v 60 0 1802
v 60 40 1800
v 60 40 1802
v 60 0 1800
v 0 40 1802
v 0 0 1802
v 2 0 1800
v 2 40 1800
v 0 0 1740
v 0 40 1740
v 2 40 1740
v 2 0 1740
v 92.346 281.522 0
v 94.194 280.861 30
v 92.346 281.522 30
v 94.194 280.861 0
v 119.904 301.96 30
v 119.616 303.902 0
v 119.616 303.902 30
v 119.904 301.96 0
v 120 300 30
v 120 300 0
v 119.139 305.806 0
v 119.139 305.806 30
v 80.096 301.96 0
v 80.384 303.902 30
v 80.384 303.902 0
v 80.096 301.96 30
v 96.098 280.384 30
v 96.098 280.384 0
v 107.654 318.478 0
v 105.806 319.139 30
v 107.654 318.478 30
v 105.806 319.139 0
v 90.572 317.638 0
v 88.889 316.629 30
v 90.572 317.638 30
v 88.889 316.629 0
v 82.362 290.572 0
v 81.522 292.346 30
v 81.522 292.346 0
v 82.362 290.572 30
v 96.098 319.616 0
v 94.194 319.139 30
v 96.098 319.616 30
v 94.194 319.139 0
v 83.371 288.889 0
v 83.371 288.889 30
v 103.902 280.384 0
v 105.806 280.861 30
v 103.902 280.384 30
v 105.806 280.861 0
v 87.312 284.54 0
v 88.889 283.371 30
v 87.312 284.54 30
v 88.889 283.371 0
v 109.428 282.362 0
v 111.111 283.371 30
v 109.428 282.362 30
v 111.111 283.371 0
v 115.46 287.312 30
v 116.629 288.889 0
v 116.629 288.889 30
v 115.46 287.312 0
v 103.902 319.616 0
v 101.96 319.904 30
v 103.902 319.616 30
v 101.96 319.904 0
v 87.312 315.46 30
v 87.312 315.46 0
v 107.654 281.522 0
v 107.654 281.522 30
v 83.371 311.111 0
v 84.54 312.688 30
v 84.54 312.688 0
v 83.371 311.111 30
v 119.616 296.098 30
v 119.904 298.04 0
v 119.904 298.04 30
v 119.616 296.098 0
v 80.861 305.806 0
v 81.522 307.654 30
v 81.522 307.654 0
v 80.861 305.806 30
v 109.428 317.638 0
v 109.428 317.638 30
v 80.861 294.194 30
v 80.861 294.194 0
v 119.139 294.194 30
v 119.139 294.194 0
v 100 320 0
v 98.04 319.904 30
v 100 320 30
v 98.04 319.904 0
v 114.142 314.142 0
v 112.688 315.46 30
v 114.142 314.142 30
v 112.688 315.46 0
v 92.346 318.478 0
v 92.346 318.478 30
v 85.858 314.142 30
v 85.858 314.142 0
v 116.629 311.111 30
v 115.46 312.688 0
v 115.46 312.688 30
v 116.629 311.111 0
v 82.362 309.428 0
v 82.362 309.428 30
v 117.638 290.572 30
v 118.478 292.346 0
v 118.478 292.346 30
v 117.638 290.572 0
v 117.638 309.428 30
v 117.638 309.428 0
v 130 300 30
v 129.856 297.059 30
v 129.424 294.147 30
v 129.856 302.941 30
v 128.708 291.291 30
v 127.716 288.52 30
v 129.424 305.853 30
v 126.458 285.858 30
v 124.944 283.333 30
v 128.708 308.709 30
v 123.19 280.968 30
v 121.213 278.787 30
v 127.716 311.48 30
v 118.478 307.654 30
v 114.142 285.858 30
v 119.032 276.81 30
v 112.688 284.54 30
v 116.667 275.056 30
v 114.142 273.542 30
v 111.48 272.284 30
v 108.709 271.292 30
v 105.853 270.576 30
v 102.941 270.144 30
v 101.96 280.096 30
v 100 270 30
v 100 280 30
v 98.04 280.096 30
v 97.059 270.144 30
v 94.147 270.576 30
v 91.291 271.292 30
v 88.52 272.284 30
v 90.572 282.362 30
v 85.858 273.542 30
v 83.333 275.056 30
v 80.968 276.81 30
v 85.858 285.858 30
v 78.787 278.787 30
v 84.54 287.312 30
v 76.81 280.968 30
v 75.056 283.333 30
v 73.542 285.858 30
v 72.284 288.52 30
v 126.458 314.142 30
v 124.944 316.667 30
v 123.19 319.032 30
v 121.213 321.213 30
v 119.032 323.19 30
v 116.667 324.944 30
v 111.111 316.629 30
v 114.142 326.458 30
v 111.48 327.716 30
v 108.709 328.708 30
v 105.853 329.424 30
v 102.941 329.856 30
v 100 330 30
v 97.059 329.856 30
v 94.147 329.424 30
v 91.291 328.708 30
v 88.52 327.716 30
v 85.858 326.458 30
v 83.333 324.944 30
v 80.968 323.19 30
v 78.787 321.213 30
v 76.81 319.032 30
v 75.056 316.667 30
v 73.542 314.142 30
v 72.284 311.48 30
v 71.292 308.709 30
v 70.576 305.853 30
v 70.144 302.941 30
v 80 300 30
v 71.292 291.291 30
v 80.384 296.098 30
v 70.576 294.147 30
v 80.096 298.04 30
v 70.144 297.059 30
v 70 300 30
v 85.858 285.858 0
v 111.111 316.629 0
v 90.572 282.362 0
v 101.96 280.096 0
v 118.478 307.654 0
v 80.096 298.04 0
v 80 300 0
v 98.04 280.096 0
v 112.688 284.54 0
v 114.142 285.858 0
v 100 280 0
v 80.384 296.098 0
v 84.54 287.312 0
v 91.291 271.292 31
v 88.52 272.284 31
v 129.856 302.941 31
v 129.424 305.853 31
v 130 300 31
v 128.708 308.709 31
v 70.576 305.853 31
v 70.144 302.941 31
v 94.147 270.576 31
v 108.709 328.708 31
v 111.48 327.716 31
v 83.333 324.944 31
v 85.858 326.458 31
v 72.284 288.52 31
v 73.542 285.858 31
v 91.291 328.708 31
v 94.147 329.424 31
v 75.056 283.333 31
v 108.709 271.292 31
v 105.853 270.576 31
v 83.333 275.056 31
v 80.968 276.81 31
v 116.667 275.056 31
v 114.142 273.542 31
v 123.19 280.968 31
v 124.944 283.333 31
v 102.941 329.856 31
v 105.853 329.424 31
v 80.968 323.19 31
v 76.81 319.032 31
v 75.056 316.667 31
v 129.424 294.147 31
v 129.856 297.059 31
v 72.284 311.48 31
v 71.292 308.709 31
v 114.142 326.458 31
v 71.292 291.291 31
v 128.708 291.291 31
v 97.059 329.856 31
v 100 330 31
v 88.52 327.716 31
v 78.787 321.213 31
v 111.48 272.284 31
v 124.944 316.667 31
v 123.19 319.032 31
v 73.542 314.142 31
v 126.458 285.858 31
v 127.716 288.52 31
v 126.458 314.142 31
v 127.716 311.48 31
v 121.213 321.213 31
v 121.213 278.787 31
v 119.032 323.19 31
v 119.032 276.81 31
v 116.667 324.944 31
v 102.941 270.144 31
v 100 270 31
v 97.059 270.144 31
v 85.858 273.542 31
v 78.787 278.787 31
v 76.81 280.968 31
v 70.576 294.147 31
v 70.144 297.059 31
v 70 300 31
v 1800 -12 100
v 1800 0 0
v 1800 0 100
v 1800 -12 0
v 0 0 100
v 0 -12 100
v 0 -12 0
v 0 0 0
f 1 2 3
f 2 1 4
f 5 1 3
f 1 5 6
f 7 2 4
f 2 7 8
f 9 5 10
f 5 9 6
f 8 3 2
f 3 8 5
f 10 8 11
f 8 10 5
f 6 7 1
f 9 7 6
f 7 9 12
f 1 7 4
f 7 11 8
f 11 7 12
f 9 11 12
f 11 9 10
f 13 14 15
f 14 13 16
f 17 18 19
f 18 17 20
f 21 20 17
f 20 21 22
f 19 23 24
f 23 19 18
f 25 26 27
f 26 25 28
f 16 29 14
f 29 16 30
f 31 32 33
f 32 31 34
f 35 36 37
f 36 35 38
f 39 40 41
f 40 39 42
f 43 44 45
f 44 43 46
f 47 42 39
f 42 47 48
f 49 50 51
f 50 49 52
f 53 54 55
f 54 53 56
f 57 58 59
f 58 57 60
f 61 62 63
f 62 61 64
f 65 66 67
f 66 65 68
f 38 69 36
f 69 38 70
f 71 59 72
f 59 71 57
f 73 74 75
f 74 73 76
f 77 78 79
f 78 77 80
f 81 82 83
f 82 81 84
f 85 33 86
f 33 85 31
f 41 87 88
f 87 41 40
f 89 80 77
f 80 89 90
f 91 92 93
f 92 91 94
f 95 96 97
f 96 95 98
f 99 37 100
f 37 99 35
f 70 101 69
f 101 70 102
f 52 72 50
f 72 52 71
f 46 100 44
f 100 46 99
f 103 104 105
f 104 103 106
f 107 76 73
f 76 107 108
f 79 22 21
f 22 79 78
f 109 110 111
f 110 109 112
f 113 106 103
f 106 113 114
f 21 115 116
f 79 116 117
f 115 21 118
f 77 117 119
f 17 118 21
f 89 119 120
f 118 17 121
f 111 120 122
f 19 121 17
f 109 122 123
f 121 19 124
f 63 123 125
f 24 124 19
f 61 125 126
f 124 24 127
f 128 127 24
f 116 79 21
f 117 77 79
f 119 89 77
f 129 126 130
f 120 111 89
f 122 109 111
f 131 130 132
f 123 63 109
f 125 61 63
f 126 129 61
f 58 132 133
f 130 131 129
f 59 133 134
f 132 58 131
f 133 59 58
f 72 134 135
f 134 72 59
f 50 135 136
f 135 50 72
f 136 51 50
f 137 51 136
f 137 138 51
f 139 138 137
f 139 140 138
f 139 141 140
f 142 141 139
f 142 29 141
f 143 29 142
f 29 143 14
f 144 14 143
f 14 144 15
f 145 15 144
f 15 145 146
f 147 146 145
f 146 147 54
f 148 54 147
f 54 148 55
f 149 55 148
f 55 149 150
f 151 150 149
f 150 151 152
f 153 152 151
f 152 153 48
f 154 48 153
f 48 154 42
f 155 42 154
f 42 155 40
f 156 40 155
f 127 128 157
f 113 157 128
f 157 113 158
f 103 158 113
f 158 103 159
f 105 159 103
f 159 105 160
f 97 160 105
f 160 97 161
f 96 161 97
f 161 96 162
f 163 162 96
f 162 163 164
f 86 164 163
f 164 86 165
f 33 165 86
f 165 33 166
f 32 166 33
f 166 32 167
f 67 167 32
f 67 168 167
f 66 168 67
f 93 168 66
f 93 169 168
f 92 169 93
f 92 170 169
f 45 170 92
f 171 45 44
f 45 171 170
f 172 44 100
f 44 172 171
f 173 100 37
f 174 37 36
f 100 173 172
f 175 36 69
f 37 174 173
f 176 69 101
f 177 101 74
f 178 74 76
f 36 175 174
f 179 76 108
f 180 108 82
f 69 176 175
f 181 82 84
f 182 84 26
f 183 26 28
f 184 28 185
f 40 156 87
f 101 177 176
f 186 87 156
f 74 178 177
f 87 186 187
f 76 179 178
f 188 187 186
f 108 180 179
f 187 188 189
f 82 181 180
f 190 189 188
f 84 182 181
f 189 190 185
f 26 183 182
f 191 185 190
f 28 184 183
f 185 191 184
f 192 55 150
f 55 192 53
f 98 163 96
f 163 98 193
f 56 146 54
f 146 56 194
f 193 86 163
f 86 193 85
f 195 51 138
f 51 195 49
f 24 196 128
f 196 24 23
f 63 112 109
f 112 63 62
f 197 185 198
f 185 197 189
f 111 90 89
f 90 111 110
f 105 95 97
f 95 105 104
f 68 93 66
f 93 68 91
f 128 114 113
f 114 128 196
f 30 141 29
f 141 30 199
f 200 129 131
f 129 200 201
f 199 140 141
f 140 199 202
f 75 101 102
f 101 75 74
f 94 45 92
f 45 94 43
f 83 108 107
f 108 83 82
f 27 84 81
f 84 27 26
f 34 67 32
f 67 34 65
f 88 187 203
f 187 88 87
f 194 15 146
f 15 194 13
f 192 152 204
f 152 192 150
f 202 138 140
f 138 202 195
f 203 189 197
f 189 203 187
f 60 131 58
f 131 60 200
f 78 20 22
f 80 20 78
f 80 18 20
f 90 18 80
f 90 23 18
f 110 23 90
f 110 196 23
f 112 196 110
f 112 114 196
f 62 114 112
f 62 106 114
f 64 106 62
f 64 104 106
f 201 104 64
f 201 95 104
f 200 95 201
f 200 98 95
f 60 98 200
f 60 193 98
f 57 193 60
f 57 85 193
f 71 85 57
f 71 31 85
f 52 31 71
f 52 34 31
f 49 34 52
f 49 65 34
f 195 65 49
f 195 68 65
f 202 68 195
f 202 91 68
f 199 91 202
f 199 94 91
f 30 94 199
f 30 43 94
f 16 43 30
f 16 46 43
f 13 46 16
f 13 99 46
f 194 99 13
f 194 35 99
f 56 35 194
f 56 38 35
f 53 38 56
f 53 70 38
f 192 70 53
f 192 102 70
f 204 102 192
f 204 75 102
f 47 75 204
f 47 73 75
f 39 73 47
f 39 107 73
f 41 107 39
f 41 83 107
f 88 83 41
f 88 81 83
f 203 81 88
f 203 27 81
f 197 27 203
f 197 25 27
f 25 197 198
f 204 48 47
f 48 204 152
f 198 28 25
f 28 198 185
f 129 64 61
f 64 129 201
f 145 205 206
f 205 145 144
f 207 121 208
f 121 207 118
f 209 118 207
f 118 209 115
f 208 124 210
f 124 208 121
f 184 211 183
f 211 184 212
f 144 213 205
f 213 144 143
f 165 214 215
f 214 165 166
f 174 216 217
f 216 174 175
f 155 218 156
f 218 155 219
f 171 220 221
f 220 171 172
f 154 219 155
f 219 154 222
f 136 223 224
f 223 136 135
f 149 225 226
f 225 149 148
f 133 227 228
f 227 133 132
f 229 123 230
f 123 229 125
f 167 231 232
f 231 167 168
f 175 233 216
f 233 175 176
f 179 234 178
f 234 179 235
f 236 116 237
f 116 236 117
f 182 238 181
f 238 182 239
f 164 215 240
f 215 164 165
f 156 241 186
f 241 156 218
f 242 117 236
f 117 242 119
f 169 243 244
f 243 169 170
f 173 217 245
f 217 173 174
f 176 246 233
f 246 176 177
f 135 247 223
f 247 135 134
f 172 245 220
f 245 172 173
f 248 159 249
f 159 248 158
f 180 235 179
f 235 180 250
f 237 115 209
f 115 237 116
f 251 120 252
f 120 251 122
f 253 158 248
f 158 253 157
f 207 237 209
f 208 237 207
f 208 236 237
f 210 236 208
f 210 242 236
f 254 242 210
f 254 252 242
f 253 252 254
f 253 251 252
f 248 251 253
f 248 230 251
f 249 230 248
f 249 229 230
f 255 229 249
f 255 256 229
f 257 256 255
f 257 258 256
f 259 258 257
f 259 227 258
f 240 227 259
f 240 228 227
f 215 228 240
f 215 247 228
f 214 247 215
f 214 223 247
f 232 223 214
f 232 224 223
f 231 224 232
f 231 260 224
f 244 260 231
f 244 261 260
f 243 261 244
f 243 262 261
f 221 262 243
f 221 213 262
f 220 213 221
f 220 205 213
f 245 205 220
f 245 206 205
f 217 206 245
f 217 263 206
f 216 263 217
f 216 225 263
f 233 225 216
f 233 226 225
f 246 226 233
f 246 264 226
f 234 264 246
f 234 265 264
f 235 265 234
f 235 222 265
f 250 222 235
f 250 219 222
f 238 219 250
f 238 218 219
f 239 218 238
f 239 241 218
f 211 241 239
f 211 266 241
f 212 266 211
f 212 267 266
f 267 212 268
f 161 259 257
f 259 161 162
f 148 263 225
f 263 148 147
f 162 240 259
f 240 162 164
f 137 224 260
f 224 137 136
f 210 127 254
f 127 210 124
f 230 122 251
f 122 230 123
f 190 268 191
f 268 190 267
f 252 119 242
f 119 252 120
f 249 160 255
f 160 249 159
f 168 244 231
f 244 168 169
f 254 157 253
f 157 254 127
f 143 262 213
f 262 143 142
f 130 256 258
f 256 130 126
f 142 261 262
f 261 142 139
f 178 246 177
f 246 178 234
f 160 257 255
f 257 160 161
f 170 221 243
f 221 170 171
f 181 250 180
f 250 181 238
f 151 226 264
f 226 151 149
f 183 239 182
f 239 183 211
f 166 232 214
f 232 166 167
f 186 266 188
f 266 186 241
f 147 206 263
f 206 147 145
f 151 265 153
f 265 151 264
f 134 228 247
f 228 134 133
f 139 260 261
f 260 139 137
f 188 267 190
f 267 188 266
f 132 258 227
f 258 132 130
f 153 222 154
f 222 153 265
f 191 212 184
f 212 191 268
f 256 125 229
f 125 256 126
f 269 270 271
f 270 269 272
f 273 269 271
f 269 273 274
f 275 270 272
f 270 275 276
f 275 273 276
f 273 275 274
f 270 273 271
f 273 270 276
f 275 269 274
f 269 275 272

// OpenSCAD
// Termite-break standoff mounting for built-in furniture
// CONCEPT GEOMETRY ONLY. Not a validated engineering drawing. Dimensions in mm.
// Generated by the Independent Intelligence Engine from the technical plan's parts list.
$fn = 64;

// wall_bracket (galvanised steel)
module wall_bracket() { cube([60, 40, 2]); }
translate([0, 0, 1800]) rotate([0, 0, 0]) wall_bracket();

// wall_bracket_leg (galvanised steel)
module wall_bracket_leg() { cube([2, 40, 60]); }
translate([0, 0, 1740]) rotate([0, 0, 0]) wall_bracket_leg();

// floor_foot (steel leveller)
module floor_foot() { cylinder(h = 30, d = 40); }
translate([100, 300, 0]) rotate([0, 0, 0]) floor_foot();

// shield_lip (galvanised steel)
module shield_lip() { cylinder(h = 1, d = 60); }
translate([100, 300, 30]) rotate([0, 0, 0]) shield_lip();

// clip_plinth (plywood or aluminium)
module clip_plinth() { cube([1800, 12, 100]); }
translate([0, -12, 0]) rotate([0, 0, 0]) clip_plinth();
